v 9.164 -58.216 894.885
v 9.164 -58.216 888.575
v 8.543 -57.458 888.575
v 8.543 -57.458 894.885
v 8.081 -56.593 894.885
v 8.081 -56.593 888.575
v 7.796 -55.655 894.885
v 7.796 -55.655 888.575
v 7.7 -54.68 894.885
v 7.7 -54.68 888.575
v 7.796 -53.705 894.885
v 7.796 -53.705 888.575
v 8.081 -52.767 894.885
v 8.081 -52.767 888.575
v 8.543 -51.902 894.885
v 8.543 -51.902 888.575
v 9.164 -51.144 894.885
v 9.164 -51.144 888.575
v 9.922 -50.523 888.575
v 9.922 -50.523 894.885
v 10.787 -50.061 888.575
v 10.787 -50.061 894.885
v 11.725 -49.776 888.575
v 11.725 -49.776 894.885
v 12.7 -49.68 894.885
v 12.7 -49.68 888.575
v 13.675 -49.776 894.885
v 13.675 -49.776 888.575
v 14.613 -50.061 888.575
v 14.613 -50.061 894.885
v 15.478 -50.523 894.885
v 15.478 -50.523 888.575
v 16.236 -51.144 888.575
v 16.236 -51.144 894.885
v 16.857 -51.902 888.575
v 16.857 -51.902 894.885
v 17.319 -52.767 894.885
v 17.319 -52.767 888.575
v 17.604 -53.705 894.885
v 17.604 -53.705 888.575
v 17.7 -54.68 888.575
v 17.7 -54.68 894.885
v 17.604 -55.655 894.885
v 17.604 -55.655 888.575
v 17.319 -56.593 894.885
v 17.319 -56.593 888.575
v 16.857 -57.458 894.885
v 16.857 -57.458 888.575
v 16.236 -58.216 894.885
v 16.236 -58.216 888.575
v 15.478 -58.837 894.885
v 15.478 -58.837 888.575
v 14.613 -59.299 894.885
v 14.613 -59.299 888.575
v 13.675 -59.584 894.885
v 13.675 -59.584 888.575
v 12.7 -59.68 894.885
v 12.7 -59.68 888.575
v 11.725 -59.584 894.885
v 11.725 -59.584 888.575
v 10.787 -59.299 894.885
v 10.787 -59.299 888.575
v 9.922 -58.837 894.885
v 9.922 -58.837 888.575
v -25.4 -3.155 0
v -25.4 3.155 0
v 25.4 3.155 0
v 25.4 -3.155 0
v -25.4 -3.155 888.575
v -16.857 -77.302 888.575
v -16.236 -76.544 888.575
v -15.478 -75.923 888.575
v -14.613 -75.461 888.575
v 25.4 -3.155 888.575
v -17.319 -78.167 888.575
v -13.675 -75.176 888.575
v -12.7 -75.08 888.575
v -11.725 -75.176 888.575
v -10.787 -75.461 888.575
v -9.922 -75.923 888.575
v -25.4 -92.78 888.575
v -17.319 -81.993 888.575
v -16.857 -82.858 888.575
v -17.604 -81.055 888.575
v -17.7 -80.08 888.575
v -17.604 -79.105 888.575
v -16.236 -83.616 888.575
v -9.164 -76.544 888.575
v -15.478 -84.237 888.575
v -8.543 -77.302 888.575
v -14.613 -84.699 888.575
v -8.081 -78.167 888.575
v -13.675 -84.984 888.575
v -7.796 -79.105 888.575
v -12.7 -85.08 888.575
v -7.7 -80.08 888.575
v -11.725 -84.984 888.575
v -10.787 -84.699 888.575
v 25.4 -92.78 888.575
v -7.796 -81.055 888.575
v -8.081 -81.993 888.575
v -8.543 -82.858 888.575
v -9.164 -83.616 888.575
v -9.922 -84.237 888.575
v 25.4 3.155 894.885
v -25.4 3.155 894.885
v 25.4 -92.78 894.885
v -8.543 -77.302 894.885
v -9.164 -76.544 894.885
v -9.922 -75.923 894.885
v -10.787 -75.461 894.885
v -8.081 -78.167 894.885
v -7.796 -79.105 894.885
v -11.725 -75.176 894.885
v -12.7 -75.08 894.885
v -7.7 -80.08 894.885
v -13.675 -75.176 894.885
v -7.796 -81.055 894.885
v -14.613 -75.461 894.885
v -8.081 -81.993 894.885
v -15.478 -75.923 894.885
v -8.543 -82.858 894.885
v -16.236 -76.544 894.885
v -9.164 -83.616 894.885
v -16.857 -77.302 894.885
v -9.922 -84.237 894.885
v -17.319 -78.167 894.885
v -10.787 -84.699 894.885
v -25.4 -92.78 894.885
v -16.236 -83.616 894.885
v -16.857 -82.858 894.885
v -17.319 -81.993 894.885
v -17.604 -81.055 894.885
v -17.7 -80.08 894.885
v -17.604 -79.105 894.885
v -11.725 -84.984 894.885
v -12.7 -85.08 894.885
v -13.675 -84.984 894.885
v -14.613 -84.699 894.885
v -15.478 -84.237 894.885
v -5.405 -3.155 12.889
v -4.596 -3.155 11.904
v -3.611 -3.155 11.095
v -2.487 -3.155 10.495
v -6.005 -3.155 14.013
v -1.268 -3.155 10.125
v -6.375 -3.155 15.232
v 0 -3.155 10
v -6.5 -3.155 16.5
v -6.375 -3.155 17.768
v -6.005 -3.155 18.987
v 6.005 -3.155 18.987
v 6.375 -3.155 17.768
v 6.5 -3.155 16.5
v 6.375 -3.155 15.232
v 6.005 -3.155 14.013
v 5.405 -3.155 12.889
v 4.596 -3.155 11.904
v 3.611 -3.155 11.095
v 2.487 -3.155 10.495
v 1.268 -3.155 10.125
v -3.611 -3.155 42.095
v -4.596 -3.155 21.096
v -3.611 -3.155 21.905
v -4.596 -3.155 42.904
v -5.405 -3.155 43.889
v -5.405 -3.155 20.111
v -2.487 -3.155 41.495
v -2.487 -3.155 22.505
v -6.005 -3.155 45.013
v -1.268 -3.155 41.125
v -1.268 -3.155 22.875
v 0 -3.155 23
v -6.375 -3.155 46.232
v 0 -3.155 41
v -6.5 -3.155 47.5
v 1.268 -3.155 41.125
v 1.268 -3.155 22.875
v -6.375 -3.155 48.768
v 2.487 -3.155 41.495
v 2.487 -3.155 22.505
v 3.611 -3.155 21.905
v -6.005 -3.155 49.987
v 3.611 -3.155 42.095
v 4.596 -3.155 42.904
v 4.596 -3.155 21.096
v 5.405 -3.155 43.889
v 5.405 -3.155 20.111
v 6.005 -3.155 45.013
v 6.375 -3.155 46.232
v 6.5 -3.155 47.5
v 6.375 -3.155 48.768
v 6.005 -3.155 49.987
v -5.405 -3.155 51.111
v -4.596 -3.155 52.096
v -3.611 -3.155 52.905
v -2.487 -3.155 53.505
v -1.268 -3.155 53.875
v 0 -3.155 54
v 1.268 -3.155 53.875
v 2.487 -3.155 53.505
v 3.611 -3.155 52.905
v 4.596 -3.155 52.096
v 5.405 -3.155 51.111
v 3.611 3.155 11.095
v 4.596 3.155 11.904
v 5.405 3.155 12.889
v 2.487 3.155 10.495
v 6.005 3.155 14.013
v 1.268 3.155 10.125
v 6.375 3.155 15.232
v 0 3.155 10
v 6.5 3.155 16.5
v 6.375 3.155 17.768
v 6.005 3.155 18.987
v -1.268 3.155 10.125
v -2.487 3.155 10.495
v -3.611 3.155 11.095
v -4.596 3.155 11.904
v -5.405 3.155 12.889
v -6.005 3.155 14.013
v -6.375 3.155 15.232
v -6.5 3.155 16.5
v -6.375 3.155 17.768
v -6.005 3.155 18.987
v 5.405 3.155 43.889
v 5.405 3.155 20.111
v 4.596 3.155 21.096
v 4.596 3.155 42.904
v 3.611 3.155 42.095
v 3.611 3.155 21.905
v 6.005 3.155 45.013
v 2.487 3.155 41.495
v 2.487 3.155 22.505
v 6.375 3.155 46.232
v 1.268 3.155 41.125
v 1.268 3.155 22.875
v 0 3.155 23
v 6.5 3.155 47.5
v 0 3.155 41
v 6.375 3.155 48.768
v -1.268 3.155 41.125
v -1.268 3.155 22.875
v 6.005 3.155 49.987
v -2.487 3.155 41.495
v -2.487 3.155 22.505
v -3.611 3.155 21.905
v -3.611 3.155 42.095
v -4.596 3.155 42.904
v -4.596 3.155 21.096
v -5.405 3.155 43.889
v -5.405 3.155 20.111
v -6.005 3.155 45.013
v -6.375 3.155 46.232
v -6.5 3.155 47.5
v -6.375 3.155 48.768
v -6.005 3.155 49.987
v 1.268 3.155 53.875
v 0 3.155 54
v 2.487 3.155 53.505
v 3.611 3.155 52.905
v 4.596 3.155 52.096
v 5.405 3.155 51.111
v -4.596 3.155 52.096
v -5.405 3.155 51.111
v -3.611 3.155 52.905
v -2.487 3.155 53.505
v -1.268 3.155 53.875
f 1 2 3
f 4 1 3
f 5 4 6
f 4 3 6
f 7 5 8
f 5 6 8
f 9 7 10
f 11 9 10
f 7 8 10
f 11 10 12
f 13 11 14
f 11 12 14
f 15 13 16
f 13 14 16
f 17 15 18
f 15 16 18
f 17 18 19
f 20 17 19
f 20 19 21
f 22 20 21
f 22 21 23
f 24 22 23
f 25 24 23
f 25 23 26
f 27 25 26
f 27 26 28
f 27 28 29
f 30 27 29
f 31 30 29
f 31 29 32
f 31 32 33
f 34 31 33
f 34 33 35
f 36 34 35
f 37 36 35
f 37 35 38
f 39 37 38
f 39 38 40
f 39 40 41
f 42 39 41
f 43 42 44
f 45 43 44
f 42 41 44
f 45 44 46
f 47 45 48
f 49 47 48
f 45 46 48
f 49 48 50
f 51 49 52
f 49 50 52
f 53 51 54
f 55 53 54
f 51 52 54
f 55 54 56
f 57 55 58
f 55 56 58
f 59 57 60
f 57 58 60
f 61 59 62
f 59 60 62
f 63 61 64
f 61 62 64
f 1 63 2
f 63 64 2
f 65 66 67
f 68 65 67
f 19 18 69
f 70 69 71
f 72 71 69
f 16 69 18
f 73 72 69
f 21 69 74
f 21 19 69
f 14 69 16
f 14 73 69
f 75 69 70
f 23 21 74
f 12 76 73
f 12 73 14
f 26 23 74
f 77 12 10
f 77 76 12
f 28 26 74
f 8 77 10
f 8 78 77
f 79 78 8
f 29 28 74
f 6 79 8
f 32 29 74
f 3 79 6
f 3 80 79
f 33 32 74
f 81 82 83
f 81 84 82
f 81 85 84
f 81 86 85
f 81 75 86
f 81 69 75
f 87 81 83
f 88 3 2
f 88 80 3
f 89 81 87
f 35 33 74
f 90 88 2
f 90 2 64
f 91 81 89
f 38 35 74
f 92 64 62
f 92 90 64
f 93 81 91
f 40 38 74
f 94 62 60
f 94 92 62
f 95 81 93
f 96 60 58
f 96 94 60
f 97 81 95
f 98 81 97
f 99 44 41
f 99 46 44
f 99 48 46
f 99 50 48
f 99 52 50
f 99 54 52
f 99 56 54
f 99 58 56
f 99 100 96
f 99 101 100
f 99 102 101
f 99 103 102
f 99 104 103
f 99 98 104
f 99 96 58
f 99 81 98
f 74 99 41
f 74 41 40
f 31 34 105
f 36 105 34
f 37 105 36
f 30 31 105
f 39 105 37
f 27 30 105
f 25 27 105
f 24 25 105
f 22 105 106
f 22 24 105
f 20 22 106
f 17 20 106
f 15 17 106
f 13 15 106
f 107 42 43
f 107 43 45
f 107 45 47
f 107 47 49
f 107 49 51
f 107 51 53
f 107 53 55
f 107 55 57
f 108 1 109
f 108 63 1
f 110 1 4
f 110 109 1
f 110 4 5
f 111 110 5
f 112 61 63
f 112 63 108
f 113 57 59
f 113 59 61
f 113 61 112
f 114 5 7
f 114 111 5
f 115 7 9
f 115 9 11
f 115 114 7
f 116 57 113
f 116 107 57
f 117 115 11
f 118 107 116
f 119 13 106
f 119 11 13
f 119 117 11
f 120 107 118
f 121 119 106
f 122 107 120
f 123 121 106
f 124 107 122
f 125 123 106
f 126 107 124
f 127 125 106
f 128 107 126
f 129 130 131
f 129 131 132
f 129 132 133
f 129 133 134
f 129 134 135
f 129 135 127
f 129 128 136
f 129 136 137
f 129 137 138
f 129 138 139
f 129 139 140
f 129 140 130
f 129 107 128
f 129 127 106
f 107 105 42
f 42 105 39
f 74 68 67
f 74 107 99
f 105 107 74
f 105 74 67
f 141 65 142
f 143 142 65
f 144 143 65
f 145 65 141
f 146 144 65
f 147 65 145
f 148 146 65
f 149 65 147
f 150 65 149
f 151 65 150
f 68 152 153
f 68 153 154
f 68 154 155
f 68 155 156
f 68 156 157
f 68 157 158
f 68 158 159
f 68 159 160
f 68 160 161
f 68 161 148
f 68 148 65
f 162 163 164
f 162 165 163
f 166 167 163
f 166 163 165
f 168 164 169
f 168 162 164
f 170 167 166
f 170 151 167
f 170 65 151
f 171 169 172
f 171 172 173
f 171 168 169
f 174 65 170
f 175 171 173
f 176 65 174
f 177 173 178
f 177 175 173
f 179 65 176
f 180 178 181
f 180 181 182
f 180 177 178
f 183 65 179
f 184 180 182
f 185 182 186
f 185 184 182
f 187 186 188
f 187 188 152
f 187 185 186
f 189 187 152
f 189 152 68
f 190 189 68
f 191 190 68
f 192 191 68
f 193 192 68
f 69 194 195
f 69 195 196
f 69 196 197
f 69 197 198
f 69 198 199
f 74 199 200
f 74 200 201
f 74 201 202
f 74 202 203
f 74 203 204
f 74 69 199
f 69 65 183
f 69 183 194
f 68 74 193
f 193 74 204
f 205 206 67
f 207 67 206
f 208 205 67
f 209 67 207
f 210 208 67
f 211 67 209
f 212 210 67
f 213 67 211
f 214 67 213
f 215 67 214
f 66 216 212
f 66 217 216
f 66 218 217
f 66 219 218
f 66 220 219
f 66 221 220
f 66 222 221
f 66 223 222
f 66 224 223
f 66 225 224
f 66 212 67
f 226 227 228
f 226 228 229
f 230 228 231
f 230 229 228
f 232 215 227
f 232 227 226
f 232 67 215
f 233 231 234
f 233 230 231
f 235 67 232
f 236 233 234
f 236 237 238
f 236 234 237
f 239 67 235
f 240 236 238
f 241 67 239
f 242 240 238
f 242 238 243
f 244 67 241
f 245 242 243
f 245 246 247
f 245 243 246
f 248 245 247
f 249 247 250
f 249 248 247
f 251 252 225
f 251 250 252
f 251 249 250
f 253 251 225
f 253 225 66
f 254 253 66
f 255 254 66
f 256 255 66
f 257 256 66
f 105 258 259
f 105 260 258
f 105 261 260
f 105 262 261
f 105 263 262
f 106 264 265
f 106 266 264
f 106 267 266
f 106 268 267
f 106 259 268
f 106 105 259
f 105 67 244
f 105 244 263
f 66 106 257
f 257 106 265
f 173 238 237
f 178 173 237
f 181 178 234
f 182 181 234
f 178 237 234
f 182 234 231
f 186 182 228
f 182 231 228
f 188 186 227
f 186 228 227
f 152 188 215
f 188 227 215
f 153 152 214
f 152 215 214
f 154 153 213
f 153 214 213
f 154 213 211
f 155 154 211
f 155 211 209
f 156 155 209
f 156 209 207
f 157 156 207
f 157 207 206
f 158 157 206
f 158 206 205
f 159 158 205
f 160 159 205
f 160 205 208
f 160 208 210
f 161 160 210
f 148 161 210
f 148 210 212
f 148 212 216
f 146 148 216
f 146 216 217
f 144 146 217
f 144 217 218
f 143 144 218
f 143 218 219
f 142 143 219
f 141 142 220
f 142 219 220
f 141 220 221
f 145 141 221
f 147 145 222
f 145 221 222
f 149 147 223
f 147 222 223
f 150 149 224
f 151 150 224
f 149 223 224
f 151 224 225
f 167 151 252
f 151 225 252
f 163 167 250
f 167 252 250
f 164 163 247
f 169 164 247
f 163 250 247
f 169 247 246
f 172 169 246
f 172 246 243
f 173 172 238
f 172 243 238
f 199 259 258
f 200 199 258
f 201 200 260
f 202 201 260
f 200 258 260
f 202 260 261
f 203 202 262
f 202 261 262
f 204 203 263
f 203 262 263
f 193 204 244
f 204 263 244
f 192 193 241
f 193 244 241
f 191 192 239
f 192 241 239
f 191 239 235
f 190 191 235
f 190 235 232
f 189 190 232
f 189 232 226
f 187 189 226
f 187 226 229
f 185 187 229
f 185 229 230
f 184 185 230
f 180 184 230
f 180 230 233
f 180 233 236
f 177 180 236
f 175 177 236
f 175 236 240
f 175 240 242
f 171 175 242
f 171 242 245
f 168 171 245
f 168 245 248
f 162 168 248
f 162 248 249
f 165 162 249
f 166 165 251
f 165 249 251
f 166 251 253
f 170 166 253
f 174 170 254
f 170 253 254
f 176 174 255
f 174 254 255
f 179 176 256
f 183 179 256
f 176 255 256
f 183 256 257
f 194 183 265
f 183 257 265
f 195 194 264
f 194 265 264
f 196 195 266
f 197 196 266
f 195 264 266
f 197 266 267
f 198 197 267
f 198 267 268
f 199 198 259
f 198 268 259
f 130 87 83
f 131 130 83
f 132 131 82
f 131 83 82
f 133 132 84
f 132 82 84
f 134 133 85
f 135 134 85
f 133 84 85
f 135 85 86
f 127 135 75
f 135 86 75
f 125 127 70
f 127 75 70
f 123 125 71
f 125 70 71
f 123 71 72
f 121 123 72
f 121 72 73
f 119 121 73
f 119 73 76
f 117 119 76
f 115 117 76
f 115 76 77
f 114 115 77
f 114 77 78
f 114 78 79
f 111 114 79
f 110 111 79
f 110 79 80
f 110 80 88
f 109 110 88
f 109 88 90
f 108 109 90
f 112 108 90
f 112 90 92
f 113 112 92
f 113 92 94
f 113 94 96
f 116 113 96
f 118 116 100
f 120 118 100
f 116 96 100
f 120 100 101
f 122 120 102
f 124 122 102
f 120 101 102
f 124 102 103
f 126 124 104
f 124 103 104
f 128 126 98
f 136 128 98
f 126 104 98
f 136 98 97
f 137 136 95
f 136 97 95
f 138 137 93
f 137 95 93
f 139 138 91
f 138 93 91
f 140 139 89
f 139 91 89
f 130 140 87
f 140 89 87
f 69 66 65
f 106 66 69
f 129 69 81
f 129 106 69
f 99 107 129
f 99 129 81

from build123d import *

# Parameters (mm, degrees)
CROQUIS1_W            = 50.8
CROQUIS1_H            = 6.31
CROQUIS2_R            = 6.5
CORTAR_EXTRUIR1_DEPTH = 10
CROQUIS3_R            = 6.5
CORTAR_EXTRUIR2_DEPTH = 10
CROQUIS4_W            = 59.2
CROQUIS4_H            = 50.8
CORTAR_EXTRUIR3_DEPTH = 10
CROQUIS5_R            = 5
CORTAR_EXTRUIR4_DEPTH = 10


with BuildPart() as part:
    # Barrer1: sweep along a curve in space
    with BuildLine() as barrer1_path:
        Line((0, 0, 0), (0, 0, 891.73))
        Line((0, 0, 891.73), (0, -67.38, 891.73))
        Line((0, -67.38, 891.73), (84.6, -67.38, 891.73))
    # Croquis1 → Barrer1 (sweep)
    with BuildSketch(Plane.XY):
        Rectangle(CROQUIS1_W, CROQUIS1_H)
    sweep(path=barrer1_path.line, transition=Transition.RIGHT)

    # Croquis2 → Cortar-Extruir1 (cut)
    with BuildSketch(Plane(origin=(0, 3.155, 0), x_dir=(1, 0, 0), z_dir=(0, 1, 0))):
        with Locations(Location((0, -16.5, 0), (0, 0, 270))):
            Circle(CROQUIS2_R)
        with Locations(Location((0, -47.5, 0), (0, 0, 270))):
            Circle(CROQUIS2_R)
    extrude(amount=-CORTAR_EXTRUIR1_DEPTH, mode=Mode.SUBTRACT)

    # Croquis3 → Cortar-Extruir2 (cut)
    with BuildSketch(Plane(origin=(0, 0, 888.575), x_dir=(-1, 0, 0), z_dir=(0, 0, -1))):
        with Locations((-60, -67.38)):
            Circle(CROQUIS3_R)
    extrude(amount=-CORTAR_EXTRUIR2_DEPTH, mode=Mode.SUBTRACT)

    # Croquis4 → Cortar-Extruir3 (cut)
    with BuildSketch(Plane.XY.offset(894.885)):
        with Locations((55, -67.38)):
            Rectangle(CROQUIS4_W, CROQUIS4_H)
    extrude(amount=-CORTAR_EXTRUIR3_DEPTH, mode=Mode.SUBTRACT)

    # Croquis5 → Cortar-Extruir4 (cut)
    with BuildSketch(Plane(origin=(0, 0, 888.575), x_dir=(-1, 0, 0), z_dir=(0, 0, -1))):
        with Locations(Location((-12.7, -54.68, 0), (0, 0, 315))):
            Circle(CROQUIS5_R)
        with Locations(Location((12.7, -80.08, 0), (0, 0, 315))):
            Circle(CROQUIS5_R)
    extrude(amount=-CORTAR_EXTRUIR4_DEPTH, mode=Mode.SUBTRACT)


solid = part.part
